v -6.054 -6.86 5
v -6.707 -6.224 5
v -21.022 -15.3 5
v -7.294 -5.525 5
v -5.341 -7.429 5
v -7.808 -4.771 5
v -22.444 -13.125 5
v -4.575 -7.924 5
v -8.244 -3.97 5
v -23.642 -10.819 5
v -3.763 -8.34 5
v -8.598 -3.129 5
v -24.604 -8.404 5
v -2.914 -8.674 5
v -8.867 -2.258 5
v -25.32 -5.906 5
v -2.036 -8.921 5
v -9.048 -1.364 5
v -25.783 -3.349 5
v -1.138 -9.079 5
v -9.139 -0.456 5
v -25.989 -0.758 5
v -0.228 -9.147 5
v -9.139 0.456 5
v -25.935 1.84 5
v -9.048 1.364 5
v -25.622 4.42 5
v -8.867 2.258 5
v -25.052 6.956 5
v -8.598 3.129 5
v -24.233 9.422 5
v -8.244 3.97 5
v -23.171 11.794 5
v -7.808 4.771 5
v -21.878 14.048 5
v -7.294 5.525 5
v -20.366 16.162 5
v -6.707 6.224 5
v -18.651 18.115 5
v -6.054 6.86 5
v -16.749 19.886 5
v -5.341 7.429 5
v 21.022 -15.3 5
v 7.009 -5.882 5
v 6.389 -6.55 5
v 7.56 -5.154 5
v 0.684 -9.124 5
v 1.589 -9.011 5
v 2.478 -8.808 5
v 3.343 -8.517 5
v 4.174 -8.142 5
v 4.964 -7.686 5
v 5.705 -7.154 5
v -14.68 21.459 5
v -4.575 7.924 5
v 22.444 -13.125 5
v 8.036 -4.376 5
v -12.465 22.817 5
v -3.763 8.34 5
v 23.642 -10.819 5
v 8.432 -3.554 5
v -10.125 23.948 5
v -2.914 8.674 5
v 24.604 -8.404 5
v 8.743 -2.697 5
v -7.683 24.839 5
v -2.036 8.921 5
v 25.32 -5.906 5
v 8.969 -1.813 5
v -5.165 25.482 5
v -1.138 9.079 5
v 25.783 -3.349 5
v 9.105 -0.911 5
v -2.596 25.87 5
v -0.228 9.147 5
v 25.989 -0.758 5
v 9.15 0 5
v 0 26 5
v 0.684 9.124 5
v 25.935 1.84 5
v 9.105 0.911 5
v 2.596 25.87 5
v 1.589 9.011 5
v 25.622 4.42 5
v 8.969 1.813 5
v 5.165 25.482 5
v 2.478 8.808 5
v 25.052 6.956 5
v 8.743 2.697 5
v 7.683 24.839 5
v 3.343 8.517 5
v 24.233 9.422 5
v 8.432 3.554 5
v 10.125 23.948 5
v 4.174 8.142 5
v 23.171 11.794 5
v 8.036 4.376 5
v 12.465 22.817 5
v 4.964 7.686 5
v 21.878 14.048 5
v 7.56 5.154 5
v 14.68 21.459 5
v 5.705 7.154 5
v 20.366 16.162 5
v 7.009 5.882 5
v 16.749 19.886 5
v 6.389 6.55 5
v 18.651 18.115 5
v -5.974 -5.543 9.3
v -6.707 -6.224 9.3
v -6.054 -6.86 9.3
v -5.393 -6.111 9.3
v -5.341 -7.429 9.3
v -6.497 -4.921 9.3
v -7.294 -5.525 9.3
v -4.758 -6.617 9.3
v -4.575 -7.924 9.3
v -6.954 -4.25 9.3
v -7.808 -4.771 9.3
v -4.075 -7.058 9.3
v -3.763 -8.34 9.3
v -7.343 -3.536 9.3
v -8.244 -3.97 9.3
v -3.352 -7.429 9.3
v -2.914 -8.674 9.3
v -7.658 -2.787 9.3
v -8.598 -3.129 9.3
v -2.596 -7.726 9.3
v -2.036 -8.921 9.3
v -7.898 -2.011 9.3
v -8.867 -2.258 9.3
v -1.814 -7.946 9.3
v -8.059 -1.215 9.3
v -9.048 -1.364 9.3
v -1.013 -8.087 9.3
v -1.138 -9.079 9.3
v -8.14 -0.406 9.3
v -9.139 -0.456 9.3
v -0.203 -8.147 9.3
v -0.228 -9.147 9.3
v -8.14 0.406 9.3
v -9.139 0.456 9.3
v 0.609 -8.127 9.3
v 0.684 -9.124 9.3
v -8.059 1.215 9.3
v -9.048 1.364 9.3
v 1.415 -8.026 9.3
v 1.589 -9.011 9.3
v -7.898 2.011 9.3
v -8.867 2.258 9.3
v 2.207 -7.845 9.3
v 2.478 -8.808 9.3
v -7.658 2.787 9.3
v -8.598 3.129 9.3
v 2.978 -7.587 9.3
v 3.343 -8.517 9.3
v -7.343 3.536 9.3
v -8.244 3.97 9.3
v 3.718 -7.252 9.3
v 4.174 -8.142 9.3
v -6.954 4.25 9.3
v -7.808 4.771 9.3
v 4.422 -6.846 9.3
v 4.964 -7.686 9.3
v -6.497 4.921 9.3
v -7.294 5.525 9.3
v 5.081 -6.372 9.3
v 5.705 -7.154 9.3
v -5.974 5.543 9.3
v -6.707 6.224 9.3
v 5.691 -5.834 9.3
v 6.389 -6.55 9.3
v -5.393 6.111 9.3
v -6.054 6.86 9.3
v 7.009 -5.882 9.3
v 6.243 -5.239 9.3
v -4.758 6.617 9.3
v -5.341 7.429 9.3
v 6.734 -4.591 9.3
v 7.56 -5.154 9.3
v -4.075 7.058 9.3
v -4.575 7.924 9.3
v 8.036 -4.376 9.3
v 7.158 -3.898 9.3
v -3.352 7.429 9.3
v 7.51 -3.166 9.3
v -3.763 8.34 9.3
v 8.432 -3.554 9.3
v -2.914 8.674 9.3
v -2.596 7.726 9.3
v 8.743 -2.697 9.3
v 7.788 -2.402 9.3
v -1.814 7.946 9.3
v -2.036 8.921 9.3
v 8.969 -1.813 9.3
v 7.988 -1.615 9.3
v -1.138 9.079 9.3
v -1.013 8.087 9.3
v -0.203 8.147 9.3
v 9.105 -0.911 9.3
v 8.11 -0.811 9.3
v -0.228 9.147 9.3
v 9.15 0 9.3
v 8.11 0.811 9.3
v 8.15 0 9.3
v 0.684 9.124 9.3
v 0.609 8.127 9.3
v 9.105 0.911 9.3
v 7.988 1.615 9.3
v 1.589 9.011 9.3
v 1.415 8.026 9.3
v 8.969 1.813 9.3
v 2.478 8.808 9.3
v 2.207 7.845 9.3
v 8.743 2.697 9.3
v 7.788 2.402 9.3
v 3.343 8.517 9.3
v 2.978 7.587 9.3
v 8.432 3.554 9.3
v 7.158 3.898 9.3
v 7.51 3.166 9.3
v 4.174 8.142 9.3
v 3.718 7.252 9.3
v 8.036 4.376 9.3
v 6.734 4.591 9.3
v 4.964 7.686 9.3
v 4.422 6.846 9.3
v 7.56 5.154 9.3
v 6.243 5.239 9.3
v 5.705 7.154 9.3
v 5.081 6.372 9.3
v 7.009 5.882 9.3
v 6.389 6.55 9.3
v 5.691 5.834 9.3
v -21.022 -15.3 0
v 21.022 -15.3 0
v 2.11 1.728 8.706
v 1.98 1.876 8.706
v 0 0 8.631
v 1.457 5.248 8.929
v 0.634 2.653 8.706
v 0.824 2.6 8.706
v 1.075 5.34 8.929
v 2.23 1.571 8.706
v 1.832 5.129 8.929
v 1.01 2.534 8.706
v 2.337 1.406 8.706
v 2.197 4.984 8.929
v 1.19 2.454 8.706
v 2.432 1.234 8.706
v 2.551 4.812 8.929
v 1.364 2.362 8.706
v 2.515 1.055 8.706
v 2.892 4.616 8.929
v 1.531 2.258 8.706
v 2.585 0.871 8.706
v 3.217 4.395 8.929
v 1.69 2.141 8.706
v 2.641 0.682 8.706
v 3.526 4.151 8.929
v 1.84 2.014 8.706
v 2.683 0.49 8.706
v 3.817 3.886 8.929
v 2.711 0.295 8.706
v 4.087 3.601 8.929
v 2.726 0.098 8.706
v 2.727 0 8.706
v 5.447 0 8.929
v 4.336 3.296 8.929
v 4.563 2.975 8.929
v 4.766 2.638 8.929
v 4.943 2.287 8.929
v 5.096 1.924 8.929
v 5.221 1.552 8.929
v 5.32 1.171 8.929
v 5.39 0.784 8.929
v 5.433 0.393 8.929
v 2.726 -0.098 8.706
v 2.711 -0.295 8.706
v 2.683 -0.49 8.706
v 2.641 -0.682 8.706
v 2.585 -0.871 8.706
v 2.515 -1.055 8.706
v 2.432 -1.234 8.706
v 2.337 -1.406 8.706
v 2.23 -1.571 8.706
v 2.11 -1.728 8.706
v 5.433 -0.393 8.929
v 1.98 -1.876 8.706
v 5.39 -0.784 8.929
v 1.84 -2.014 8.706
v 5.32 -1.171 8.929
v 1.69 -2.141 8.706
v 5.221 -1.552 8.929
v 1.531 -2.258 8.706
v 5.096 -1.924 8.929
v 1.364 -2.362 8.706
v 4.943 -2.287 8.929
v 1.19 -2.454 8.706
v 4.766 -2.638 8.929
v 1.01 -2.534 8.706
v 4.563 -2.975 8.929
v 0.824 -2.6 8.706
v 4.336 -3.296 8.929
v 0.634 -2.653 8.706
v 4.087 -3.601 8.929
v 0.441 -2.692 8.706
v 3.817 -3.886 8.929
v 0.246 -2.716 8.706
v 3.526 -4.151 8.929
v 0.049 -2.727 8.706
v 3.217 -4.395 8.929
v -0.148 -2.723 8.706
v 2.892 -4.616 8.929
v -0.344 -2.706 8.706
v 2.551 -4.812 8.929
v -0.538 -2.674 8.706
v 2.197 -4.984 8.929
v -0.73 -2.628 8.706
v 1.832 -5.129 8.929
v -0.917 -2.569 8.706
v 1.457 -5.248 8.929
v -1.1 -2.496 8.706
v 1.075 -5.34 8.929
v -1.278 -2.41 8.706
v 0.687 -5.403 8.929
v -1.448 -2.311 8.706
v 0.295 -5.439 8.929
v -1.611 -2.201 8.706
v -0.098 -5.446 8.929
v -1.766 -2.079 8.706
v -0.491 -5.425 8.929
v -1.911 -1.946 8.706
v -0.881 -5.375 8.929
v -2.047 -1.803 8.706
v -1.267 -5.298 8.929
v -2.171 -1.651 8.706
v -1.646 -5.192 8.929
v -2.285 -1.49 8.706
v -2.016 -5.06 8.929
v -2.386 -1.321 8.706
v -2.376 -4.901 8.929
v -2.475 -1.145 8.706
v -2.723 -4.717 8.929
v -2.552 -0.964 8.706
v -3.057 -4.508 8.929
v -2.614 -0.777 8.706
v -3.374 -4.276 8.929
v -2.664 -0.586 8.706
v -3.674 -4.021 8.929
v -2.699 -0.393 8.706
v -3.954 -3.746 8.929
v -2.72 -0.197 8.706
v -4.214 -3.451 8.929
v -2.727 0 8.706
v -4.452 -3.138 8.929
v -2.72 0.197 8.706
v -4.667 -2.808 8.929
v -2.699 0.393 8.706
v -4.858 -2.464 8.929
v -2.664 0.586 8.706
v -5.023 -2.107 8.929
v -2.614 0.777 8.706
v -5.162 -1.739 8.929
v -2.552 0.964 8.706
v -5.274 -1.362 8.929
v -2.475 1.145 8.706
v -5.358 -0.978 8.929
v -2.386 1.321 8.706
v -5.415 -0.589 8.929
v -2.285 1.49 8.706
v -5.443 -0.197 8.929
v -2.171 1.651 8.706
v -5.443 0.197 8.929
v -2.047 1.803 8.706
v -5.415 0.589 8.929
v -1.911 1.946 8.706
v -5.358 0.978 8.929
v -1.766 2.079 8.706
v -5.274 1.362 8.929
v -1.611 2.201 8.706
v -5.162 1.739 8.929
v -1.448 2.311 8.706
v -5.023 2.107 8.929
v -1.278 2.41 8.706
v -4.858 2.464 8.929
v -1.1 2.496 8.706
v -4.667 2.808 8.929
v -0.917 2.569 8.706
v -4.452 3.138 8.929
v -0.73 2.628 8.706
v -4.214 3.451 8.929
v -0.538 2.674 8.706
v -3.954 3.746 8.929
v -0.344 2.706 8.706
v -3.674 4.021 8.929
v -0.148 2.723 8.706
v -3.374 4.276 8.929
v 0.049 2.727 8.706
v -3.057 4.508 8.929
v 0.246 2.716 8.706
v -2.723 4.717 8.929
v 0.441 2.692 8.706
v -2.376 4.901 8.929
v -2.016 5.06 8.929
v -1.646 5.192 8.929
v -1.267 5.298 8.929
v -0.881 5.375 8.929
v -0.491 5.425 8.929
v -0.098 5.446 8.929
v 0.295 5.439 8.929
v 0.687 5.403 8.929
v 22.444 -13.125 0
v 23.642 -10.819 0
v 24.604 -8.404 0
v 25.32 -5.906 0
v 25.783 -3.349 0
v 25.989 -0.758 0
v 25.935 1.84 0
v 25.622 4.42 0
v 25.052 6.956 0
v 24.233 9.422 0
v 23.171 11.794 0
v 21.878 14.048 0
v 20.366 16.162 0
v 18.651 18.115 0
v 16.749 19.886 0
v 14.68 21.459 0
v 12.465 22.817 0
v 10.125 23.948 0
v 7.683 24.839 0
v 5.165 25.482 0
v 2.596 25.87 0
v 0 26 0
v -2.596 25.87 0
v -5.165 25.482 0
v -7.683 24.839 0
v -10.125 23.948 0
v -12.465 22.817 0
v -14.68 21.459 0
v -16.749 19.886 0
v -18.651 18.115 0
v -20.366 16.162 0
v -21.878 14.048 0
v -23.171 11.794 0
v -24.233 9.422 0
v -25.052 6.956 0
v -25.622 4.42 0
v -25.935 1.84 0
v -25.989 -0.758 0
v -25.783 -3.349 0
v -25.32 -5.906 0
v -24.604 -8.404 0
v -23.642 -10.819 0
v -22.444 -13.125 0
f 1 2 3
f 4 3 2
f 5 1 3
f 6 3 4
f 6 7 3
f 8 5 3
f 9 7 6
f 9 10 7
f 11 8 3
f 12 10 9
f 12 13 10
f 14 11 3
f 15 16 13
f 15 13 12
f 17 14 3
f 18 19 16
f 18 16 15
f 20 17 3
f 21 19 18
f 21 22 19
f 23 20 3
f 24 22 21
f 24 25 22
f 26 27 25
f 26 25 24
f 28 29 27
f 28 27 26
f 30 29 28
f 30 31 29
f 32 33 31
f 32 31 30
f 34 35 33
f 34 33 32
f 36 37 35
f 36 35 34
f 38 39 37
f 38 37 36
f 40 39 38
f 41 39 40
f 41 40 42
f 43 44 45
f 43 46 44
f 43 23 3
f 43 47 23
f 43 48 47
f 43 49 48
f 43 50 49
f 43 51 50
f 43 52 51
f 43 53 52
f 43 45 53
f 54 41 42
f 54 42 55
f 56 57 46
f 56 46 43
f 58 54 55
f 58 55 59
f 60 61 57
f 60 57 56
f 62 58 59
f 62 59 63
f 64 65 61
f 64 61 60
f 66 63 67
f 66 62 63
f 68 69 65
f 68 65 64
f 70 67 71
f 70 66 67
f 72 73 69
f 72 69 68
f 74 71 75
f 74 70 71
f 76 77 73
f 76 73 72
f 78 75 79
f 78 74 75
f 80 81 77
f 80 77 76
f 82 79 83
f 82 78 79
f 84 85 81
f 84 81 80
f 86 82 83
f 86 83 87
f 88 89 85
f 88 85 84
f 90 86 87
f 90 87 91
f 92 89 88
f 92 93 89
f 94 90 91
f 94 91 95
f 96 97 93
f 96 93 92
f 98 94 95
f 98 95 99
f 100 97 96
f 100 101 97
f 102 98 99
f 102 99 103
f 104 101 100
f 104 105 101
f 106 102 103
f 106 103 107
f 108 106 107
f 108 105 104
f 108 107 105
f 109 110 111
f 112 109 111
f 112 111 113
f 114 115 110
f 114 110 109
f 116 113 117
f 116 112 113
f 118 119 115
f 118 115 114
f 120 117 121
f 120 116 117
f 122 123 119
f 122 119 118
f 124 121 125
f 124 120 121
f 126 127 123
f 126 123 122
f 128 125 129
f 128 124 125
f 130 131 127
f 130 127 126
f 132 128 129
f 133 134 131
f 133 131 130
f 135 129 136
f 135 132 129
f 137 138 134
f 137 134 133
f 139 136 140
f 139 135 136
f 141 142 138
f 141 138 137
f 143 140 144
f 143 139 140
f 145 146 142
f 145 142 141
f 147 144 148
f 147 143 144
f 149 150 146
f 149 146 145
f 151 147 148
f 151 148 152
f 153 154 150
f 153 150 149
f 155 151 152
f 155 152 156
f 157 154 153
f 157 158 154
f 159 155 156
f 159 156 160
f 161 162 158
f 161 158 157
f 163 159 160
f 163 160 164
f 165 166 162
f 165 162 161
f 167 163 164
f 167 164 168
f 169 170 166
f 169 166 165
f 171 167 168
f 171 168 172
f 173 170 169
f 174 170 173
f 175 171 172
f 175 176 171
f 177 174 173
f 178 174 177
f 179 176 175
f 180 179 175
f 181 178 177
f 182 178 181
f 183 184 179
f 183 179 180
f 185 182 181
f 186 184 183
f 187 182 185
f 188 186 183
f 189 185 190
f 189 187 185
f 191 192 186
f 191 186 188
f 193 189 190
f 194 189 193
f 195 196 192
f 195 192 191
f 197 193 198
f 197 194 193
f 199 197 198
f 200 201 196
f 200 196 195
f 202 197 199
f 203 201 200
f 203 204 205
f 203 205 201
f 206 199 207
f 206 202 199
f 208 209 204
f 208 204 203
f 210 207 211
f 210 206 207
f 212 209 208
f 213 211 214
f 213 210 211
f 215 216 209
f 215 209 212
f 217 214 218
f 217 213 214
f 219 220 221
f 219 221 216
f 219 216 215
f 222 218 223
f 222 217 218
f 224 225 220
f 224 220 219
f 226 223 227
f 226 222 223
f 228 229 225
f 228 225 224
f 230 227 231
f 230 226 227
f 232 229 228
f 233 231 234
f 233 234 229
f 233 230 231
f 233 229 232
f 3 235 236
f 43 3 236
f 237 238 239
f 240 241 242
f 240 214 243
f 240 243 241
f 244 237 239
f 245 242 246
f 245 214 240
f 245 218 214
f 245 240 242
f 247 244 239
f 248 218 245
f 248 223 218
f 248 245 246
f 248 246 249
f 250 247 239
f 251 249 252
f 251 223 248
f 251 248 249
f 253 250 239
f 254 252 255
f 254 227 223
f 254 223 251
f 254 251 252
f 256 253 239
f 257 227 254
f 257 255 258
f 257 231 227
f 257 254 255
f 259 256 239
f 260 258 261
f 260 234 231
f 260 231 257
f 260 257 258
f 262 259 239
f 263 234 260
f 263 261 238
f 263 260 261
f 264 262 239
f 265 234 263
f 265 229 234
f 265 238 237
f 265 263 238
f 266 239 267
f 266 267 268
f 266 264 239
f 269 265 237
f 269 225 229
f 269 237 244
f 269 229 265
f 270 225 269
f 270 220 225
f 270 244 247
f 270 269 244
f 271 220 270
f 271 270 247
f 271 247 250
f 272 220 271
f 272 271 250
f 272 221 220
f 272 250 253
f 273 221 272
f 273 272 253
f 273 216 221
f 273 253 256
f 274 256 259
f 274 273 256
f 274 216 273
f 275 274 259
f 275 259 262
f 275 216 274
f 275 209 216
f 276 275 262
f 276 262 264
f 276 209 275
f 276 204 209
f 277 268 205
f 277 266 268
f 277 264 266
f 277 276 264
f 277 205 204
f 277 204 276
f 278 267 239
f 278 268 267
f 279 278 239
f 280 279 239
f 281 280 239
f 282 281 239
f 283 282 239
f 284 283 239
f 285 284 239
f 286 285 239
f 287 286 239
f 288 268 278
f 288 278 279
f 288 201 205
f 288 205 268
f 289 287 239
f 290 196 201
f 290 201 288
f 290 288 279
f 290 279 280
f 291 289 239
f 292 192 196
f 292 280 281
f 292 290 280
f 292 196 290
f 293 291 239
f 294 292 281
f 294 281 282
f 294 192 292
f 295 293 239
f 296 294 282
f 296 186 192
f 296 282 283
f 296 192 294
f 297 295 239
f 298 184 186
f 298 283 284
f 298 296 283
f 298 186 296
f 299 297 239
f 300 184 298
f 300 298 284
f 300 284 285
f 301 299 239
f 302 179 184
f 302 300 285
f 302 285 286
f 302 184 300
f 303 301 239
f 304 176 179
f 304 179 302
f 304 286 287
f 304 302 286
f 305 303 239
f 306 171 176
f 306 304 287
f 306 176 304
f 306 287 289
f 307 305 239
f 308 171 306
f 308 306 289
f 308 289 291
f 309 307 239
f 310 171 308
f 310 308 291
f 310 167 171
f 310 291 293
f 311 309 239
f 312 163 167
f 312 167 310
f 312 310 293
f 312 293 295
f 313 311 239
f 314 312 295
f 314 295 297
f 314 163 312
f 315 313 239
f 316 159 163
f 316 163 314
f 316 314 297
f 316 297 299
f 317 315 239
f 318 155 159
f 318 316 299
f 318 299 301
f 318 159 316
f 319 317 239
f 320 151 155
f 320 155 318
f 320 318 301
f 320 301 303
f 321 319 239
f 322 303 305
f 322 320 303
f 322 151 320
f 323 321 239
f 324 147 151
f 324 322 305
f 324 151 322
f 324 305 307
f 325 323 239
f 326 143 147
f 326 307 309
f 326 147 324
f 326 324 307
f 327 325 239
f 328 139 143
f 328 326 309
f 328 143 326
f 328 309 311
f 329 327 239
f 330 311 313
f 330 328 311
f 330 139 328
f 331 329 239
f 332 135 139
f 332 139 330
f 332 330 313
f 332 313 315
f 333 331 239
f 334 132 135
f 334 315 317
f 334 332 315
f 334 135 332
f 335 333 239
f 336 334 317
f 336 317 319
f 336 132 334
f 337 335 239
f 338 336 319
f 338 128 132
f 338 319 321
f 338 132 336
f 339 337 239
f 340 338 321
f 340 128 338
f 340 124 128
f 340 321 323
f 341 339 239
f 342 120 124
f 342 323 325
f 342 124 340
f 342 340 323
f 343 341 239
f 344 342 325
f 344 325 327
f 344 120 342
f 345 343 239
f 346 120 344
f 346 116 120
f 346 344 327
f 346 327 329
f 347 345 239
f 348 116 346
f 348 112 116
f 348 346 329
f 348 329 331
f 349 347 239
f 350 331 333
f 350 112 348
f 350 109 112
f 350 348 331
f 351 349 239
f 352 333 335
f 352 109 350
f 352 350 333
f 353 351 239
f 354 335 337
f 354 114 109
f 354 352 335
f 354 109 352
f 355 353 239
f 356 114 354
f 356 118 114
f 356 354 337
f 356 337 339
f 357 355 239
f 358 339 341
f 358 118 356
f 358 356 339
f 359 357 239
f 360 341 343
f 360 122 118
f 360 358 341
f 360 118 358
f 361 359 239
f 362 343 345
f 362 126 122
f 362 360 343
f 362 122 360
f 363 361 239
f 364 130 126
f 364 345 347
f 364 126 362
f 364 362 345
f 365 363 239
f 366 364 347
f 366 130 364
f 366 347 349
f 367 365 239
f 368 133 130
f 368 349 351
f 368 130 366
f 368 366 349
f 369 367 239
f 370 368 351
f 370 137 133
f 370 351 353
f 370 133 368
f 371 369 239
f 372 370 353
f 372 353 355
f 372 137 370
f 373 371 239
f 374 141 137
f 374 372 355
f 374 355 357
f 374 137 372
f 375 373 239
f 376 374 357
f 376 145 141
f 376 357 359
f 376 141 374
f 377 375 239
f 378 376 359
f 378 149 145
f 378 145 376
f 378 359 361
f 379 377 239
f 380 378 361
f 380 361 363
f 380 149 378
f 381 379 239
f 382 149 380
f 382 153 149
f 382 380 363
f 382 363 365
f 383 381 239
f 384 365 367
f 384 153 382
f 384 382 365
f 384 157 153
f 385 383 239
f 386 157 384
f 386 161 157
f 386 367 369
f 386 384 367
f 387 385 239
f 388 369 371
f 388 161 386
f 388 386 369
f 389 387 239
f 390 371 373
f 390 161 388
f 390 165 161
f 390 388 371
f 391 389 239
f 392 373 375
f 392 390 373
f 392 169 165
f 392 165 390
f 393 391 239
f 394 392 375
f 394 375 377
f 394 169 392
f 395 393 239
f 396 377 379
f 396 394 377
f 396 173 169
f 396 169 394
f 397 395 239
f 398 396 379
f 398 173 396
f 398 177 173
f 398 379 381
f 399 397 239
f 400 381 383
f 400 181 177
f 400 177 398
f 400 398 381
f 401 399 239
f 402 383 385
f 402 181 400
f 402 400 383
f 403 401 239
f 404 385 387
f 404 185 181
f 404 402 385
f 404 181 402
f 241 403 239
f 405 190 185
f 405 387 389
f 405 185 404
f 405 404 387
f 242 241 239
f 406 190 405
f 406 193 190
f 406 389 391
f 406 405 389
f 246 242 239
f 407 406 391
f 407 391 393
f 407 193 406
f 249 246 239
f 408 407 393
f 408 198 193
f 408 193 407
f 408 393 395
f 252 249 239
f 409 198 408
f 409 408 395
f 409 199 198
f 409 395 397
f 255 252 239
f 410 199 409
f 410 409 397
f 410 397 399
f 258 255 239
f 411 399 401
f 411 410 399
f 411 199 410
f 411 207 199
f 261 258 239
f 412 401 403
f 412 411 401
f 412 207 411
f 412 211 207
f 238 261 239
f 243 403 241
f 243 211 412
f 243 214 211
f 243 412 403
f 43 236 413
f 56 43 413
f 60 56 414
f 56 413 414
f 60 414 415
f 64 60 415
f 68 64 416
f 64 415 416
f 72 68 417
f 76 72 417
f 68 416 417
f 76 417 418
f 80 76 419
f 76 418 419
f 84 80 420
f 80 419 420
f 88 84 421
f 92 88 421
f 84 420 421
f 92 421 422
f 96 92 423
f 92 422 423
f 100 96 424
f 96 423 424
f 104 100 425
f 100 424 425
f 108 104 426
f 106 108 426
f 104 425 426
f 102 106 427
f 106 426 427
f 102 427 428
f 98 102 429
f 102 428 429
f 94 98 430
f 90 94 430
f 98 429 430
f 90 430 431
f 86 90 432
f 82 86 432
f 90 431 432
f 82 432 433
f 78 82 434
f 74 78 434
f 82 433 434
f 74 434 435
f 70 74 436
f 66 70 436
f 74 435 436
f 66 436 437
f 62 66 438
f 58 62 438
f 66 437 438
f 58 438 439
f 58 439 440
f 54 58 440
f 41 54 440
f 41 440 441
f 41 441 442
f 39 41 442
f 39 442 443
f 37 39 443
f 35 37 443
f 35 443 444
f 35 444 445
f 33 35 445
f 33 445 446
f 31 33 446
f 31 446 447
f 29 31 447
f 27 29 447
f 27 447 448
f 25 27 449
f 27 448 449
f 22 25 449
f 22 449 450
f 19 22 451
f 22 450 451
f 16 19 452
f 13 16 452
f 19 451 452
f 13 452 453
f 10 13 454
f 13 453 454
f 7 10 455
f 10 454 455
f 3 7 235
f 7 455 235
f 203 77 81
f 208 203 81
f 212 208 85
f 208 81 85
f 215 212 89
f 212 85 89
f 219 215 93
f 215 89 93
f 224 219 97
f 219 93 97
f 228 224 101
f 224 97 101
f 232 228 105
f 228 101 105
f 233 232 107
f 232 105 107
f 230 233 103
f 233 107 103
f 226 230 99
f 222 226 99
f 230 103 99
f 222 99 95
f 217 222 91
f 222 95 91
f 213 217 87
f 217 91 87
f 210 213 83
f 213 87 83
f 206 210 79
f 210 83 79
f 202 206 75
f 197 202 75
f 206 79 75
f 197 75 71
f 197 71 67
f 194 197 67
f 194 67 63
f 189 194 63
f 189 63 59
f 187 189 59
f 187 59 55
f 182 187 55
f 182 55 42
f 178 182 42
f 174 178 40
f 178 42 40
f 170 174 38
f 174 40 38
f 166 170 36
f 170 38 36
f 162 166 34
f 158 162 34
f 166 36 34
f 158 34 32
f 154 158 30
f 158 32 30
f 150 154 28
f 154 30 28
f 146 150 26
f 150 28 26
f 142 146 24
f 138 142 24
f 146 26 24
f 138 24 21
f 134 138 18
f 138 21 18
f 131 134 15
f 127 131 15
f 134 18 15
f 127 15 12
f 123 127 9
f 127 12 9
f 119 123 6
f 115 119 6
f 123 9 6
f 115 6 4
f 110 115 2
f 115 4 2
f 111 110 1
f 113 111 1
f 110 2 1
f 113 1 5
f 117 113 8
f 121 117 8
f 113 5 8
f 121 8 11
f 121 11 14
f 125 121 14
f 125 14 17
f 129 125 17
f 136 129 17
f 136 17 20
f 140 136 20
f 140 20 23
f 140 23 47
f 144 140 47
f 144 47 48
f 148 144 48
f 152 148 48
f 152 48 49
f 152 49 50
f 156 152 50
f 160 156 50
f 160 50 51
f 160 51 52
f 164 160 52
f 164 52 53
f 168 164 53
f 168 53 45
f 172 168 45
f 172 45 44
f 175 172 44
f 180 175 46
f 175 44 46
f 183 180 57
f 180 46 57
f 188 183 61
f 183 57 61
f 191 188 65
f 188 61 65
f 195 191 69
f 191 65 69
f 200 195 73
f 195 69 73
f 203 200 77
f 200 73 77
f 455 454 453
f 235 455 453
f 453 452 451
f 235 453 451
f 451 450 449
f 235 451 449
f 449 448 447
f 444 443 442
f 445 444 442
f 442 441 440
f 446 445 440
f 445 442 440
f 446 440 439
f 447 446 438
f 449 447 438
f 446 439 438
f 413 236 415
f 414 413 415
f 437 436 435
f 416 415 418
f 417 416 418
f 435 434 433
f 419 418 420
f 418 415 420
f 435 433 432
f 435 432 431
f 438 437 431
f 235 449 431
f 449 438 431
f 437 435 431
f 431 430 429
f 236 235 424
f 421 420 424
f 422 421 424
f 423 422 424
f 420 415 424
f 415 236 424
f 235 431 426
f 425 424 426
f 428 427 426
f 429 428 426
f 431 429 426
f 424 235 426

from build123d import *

# Parameters (mm, degrees)
BOSS_EXTRUDE1_DEPTH = 5
SKETCH2_R           = 9.15
BOSS_EXTRUDE2_DEPTH = 4.3


with BuildPart() as part:
    # Sketch1 → Boss-Extrude1 (new body)
    with BuildSketch(Plane.XY):
        with BuildLine():
            Line((-21.021655501, -15.3), (21.021655501, -15.3))
            ThreePointArc((21.021655501, -15.3), (0, 26), (-21.021655501, -15.3))
        make_face()
    extrude(amount=BOSS_EXTRUDE1_DEPTH)

    # Sketch2 → Boss-Extrude2 (add)
    with BuildSketch(Plane.XY.offset(5)):
        Circle(SKETCH2_R)
    extrude(amount=BOSS_EXTRUDE2_DEPTH)

    # Sketch3 → Cut-Revolve1 (revolve, cut)
    with BuildSketch(Plane.XZ):
        with BuildLine():
            Line((0, 9.3), (0, 8.631303449))
            ThreePointArc((0, 8.631303449), (4.088693406, 8.798757997), (8.15, 9.3))
            Line((8.15, 9.3), (0, 9.3))
        make_face()
    revolve(axis=Axis((0, 0, 9.3), (0, 0, -1)), mode=Mode.SUBTRACT)


solid = part.part
